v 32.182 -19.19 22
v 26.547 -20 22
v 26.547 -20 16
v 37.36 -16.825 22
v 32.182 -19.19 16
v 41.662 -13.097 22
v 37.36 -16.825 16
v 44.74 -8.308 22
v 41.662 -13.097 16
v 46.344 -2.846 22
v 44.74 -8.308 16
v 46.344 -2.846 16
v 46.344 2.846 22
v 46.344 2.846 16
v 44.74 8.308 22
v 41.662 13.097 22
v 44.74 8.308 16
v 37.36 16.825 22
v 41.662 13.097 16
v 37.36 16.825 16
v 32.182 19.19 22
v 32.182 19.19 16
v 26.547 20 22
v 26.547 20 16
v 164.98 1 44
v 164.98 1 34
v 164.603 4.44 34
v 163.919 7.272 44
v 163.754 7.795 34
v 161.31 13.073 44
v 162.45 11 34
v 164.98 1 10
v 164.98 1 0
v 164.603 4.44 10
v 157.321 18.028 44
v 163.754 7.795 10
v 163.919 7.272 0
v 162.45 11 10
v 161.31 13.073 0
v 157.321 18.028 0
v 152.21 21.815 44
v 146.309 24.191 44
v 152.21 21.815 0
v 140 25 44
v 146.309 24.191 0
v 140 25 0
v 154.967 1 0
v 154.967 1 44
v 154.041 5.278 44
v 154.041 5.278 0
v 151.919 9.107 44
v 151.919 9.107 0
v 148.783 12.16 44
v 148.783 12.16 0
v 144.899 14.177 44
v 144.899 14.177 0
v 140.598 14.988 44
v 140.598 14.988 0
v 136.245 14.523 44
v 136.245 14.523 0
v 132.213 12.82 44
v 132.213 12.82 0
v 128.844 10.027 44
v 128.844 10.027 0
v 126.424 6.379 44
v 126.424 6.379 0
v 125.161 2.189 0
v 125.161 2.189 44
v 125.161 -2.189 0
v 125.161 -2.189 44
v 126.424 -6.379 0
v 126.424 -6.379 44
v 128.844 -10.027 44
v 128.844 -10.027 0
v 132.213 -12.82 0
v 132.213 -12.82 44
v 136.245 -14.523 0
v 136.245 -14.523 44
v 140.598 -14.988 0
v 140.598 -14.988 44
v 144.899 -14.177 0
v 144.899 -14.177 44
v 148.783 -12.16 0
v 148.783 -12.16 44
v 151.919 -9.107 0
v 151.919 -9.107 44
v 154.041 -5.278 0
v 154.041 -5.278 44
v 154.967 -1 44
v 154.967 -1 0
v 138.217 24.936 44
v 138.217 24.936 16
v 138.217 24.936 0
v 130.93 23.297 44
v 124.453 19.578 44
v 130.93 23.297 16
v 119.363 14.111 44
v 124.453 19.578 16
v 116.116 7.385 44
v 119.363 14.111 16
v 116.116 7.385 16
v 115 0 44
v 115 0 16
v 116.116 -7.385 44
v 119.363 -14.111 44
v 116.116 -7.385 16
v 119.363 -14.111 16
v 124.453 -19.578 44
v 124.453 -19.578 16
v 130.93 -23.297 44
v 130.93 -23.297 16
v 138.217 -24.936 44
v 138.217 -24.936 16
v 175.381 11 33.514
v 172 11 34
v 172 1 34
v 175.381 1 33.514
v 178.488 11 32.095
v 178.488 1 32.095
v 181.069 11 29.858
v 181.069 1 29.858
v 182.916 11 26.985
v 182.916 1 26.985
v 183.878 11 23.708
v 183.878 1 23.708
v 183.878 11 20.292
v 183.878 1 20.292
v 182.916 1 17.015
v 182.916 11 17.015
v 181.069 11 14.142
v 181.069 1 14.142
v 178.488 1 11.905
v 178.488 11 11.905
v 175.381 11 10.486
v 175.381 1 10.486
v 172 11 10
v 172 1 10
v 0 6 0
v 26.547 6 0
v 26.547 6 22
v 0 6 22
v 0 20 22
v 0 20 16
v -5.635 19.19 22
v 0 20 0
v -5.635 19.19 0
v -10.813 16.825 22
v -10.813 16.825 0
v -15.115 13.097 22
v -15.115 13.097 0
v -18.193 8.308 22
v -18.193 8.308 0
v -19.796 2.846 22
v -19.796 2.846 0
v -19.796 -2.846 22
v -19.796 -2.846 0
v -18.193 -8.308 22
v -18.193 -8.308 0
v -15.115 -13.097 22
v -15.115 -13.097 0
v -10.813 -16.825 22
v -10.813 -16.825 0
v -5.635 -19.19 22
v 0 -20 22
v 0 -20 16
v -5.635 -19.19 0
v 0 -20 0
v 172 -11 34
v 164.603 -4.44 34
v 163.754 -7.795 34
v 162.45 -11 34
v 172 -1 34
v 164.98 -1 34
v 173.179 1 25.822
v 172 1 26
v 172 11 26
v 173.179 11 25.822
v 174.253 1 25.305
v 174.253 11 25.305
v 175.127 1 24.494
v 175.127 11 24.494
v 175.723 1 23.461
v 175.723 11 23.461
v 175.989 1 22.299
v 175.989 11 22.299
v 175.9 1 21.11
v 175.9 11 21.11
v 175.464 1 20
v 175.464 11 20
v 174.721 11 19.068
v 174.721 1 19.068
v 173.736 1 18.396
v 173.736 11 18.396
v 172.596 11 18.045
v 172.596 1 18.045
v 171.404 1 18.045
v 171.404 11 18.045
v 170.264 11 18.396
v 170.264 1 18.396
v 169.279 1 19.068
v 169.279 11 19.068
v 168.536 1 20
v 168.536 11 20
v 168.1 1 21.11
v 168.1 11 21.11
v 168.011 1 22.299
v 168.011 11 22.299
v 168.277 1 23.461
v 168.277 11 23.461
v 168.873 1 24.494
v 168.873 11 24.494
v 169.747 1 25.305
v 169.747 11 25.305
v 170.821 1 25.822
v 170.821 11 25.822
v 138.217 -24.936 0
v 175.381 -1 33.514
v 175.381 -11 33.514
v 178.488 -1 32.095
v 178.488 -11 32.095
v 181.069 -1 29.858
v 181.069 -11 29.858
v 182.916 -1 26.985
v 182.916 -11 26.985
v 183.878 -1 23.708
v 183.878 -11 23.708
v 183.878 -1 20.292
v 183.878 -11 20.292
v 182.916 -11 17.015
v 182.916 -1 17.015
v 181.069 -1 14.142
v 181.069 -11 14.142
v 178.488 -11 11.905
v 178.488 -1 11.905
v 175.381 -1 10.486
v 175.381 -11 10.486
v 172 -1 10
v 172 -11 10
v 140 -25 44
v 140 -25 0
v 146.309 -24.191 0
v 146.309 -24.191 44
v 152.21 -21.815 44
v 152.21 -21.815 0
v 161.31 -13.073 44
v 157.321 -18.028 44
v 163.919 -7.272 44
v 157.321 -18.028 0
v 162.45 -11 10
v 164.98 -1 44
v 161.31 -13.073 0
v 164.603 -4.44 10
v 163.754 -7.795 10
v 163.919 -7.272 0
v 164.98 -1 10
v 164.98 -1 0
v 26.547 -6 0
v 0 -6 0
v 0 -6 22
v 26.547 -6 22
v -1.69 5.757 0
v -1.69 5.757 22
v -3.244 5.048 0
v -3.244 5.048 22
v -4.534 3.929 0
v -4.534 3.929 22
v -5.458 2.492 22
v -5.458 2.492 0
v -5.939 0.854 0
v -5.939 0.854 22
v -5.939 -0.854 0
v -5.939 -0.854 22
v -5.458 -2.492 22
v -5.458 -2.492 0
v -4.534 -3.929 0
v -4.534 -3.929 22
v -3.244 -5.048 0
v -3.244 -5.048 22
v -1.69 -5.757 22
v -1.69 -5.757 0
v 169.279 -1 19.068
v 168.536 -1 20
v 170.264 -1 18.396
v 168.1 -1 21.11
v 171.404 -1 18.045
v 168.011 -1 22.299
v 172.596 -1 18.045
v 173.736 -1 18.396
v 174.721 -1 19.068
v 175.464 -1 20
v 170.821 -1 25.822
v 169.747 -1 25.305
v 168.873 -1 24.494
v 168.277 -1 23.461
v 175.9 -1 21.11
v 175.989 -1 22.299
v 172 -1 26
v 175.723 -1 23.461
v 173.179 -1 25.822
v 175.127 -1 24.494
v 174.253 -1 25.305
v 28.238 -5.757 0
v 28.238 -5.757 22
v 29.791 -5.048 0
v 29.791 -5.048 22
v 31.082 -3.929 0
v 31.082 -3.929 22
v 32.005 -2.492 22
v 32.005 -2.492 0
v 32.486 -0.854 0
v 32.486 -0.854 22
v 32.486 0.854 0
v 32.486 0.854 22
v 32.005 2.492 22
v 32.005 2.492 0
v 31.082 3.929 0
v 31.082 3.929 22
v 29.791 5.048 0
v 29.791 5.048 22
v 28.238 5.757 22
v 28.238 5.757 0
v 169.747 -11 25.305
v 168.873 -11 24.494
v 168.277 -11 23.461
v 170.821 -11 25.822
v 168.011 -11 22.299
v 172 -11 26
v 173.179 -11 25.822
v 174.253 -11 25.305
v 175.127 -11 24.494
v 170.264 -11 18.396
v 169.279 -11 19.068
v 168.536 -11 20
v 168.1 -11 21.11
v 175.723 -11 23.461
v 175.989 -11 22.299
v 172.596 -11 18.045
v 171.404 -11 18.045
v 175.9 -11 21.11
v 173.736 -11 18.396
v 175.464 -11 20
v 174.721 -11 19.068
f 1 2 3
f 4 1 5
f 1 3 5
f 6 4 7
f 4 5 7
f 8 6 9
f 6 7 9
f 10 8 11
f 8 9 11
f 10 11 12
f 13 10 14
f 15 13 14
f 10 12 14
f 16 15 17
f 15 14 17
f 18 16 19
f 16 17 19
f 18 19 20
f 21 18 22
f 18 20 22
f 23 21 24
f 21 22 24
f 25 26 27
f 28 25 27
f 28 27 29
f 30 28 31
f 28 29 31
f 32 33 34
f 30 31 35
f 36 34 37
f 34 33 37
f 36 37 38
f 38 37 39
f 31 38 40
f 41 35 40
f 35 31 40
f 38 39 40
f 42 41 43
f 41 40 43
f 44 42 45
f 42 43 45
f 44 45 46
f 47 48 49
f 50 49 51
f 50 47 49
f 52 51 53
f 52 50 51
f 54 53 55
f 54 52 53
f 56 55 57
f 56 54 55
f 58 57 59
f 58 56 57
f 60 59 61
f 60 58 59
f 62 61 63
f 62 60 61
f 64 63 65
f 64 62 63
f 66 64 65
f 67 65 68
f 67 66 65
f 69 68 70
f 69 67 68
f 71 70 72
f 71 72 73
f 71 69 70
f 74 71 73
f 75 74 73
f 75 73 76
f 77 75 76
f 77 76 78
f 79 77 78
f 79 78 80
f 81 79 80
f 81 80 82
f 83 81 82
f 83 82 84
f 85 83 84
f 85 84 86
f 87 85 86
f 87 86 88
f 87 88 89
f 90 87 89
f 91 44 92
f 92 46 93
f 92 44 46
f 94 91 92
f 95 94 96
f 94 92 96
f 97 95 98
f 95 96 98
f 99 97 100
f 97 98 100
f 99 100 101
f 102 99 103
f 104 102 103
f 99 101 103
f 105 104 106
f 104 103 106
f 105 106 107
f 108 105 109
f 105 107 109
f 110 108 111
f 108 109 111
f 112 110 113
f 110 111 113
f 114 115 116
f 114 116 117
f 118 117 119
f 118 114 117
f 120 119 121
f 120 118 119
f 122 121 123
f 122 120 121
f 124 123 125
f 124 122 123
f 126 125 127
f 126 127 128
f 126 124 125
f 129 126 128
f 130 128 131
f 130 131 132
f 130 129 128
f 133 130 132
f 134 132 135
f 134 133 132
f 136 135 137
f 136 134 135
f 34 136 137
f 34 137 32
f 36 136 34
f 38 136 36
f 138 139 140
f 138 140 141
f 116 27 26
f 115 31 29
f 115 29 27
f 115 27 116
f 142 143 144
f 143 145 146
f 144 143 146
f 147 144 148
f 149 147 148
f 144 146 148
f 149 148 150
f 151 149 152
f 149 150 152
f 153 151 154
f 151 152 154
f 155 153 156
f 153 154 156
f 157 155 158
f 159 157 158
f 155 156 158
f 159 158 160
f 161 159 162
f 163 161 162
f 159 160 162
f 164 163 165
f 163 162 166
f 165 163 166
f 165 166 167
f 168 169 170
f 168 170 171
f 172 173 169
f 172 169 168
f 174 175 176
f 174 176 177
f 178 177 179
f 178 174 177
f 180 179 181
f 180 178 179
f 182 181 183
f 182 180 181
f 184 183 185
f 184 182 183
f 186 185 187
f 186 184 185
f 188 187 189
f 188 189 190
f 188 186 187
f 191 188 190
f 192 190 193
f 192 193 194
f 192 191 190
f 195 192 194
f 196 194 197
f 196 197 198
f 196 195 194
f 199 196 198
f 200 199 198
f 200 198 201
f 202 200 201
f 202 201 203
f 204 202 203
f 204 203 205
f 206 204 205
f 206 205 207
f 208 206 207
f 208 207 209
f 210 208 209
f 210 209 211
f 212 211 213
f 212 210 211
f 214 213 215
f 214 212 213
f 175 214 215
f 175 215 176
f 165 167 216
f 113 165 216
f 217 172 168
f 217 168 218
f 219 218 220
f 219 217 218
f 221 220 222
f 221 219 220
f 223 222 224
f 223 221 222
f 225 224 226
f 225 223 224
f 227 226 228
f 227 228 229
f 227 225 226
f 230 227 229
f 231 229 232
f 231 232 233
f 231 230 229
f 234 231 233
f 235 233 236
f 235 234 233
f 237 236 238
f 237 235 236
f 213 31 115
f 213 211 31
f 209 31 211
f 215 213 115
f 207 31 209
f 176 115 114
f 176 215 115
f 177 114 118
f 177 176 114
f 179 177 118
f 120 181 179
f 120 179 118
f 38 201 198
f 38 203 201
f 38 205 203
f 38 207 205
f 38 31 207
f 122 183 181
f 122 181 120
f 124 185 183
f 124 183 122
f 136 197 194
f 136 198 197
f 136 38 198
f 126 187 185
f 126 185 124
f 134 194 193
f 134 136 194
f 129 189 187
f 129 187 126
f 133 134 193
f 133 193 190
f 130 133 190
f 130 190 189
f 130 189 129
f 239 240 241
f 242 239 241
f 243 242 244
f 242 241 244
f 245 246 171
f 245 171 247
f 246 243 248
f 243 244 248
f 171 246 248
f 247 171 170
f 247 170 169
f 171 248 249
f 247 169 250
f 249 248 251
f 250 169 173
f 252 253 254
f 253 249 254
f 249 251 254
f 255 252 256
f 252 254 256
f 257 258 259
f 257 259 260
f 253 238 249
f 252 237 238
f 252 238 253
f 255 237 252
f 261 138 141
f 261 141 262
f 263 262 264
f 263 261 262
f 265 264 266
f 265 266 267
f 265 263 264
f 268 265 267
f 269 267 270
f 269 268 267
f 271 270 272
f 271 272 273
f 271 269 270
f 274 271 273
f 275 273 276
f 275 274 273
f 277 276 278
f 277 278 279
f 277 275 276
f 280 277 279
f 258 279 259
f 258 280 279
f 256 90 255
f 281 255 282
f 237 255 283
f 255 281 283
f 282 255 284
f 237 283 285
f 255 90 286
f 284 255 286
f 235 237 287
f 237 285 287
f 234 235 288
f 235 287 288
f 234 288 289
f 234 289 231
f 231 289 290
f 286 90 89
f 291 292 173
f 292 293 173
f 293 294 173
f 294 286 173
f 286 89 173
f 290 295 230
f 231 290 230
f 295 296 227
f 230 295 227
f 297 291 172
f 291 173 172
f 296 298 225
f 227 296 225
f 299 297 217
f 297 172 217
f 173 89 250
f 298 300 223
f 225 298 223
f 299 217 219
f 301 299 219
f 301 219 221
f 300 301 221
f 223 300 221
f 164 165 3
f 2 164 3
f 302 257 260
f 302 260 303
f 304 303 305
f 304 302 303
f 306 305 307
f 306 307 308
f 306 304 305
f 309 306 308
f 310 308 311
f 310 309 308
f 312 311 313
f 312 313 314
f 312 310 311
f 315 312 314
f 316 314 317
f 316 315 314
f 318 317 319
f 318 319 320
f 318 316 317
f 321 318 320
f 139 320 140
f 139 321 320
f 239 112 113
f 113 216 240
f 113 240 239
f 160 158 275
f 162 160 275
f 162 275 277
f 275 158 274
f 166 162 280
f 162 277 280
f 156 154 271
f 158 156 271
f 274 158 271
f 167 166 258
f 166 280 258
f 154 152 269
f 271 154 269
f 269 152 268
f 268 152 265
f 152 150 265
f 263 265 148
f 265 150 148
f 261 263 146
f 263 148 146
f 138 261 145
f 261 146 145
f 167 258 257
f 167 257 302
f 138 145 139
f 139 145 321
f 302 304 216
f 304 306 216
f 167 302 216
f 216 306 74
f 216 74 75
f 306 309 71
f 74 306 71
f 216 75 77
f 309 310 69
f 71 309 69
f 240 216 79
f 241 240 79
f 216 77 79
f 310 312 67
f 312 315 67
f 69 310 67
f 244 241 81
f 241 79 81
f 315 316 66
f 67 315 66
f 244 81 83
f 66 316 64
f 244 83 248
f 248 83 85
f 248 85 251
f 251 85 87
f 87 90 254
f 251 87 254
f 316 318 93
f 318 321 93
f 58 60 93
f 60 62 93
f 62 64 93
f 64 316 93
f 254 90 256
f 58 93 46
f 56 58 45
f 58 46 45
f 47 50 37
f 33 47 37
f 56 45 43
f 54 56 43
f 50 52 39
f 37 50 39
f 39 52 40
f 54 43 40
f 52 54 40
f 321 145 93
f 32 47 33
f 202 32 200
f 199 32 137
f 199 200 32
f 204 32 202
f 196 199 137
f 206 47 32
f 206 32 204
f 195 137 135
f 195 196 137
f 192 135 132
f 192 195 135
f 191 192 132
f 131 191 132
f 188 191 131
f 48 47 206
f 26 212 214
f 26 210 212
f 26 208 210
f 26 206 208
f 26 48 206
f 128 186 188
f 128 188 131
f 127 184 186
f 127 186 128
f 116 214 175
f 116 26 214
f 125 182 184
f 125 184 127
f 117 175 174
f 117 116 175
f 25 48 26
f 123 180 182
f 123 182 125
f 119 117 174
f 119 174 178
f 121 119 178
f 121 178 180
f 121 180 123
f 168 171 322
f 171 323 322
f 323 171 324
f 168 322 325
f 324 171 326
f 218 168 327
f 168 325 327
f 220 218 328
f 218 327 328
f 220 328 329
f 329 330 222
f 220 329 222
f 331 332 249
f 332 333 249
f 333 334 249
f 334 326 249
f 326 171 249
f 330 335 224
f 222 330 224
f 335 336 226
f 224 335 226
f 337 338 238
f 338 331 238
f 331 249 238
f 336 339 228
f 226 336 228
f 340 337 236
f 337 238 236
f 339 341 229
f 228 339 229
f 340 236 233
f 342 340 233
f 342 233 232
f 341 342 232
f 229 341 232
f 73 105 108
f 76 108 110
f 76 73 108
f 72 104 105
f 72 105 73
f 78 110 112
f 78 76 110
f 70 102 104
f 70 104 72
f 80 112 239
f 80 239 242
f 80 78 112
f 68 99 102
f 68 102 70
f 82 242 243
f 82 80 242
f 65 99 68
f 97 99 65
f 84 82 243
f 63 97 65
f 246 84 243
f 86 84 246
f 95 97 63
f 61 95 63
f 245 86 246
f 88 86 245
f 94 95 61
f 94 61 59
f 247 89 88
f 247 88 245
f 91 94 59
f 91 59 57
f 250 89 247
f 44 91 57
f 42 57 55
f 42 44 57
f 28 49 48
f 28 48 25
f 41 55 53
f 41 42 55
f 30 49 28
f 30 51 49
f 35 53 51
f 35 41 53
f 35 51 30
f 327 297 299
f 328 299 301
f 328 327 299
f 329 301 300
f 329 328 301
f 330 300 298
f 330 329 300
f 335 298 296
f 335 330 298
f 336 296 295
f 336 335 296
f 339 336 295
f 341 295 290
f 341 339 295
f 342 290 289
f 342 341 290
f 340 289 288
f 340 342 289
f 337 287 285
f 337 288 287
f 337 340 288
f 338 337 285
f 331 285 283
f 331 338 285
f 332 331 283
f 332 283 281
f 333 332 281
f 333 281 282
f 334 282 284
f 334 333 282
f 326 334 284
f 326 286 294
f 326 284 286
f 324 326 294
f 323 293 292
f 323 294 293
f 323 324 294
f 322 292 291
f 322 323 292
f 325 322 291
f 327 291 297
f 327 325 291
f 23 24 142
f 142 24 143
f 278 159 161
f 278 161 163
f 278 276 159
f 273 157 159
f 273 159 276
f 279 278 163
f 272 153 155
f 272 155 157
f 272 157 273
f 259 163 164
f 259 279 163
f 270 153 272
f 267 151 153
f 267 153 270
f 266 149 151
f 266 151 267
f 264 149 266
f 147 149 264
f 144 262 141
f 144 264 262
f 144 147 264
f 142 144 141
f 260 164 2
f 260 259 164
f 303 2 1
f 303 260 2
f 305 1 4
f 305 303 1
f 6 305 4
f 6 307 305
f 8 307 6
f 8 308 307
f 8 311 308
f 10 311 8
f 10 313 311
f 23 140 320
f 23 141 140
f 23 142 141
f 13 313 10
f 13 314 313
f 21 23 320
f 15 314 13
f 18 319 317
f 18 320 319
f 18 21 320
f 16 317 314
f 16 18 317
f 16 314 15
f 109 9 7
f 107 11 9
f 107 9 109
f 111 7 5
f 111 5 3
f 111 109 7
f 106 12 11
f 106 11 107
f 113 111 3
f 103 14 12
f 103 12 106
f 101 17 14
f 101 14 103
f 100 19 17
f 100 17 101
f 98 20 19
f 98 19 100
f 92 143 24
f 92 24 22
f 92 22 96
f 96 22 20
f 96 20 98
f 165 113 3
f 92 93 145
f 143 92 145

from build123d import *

# Parameters (mm, degrees)
SKICA2_R                 = 15
P_IDAT_VYSUNUT_M1_DEPTH  = 16
P_IDAT_VYSUNUT_M2_DEPTH  = 22
SKICA2_4_R               = 15
P_IDAT_VYSUNUT_M3_DEPTH  = 44
SKICA3_R                 = 4
P_IDAT_VYSUNUT_M4_DEPTH  = 11
SKICA4_W                 = 50
SKICA4_H                 = 2
ODEBRAT_VYSUNUT_M1_DEPTH = 191.832387188


with BuildPart() as part:
    # Skica2 → Přidat vysunutím1 (new body)
    with BuildSketch(Plane.XY):
        with BuildLine():
            ThreePointArc((0, 20), (-20, 0), (0, -20))
            Line((0, -20), (140, -25))
            ThreePointArc((140, -25), (165, 0), (140, 25))
            Line((140, 25), (0, 20))
        make_face()
        with Locations((140, 0)):
            Circle(SKICA2_R, mode=Mode.SUBTRACT)
        with BuildLine():
            Line((26.547310648, -6), (0, -6))
            ThreePointArc((0, -6), (-6, 0), (0, 6))
            Line((0, 6), (26.547310648, 6))
            ThreePointArc((26.547310648, 6), (32.547310648, 0), (26.547310648, -6))
        make_face(mode=Mode.SUBTRACT)
    extrude(amount=P_IDAT_VYSUNUT_M1_DEPTH)

    # Skica2<3> → Přidat vysunutím2 (add)
    with BuildSketch(Plane.XY):
        with BuildLine():
            Line((26.547310648, 20), (0, 20))
            ThreePointArc((0, 20), (-20, 0), (0, -20))
            Line((0, -20), (26.547310648, -20))
            ThreePointArc((26.547310648, -20), (46.547310648, 0), (26.547310648, 20))
        make_face()
        with BuildLine():
            ThreePointArc((0, -6), (-6, 0), (0, 6))
            Line((0, 6), (26.547310648, 6))
            ThreePointArc((26.547310648, 6), (32.547310648, 0), (26.547310648, -6))
            Line((26.547310648, -6), (0, -6))
        make_face(mode=Mode.SUBTRACT)
    extrude(amount=P_IDAT_VYSUNUT_M2_DEPTH)

    # Skica2<4> → Přidat vysunutím3 (add)
    with BuildSketch(Plane.XY):
        with BuildLine():
            Line((140, 25), (138.21656051, 24.936305732))
            ThreePointArc((138.21656051, 24.936305732), (115, 0), (138.21656051, -24.936305732))
            Line((138.21656051, -24.936305732), (140, -25))
            ThreePointArc((140, -25), (157.67766953, -17.67766953), (165, 0))
            ThreePointArc((165, 0), (157.67766953, 17.67766953), (140, 25))
        make_face()
        with Locations((140, 0)):
            Circle(SKICA2_4_R, mode=Mode.SUBTRACT)
    extrude(amount=P_IDAT_VYSUNUT_M3_DEPTH)

    # Skica3 → Přidat vysunutím4 (add, symmetric)
    with BuildSketch(Plane(origin=(0, 0, 0), x_dir=(1, 0, 0), z_dir=(0, 1, 0))):
        with BuildLine():
            Line((172, -10), (156.52015128, -10))
            Line((156.52015128, -10), (156.52015128, -34))
            Line((156.52015128, -34), (172, -34))
            ThreePointArc((172, -34), (184, -22), (172, -10))
        make_face()
        with Locations((172, -22)):
            Circle(SKICA3_R, mode=Mode.SUBTRACT)
    extrude(amount=P_IDAT_VYSUNUT_M4_DEPTH, both=True)

    # Skica4 → Odebrat vysunutím1 (cut, through all)
    with BuildSketch(Plane.XY.offset(44)):
        with Locations((165, 0)):
            Rectangle(SKICA4_W, SKICA4_H)
    extrude(amount=-ODEBRAT_VYSUNUT_M1_DEPTH, mode=Mode.SUBTRACT)


solid = part.part
